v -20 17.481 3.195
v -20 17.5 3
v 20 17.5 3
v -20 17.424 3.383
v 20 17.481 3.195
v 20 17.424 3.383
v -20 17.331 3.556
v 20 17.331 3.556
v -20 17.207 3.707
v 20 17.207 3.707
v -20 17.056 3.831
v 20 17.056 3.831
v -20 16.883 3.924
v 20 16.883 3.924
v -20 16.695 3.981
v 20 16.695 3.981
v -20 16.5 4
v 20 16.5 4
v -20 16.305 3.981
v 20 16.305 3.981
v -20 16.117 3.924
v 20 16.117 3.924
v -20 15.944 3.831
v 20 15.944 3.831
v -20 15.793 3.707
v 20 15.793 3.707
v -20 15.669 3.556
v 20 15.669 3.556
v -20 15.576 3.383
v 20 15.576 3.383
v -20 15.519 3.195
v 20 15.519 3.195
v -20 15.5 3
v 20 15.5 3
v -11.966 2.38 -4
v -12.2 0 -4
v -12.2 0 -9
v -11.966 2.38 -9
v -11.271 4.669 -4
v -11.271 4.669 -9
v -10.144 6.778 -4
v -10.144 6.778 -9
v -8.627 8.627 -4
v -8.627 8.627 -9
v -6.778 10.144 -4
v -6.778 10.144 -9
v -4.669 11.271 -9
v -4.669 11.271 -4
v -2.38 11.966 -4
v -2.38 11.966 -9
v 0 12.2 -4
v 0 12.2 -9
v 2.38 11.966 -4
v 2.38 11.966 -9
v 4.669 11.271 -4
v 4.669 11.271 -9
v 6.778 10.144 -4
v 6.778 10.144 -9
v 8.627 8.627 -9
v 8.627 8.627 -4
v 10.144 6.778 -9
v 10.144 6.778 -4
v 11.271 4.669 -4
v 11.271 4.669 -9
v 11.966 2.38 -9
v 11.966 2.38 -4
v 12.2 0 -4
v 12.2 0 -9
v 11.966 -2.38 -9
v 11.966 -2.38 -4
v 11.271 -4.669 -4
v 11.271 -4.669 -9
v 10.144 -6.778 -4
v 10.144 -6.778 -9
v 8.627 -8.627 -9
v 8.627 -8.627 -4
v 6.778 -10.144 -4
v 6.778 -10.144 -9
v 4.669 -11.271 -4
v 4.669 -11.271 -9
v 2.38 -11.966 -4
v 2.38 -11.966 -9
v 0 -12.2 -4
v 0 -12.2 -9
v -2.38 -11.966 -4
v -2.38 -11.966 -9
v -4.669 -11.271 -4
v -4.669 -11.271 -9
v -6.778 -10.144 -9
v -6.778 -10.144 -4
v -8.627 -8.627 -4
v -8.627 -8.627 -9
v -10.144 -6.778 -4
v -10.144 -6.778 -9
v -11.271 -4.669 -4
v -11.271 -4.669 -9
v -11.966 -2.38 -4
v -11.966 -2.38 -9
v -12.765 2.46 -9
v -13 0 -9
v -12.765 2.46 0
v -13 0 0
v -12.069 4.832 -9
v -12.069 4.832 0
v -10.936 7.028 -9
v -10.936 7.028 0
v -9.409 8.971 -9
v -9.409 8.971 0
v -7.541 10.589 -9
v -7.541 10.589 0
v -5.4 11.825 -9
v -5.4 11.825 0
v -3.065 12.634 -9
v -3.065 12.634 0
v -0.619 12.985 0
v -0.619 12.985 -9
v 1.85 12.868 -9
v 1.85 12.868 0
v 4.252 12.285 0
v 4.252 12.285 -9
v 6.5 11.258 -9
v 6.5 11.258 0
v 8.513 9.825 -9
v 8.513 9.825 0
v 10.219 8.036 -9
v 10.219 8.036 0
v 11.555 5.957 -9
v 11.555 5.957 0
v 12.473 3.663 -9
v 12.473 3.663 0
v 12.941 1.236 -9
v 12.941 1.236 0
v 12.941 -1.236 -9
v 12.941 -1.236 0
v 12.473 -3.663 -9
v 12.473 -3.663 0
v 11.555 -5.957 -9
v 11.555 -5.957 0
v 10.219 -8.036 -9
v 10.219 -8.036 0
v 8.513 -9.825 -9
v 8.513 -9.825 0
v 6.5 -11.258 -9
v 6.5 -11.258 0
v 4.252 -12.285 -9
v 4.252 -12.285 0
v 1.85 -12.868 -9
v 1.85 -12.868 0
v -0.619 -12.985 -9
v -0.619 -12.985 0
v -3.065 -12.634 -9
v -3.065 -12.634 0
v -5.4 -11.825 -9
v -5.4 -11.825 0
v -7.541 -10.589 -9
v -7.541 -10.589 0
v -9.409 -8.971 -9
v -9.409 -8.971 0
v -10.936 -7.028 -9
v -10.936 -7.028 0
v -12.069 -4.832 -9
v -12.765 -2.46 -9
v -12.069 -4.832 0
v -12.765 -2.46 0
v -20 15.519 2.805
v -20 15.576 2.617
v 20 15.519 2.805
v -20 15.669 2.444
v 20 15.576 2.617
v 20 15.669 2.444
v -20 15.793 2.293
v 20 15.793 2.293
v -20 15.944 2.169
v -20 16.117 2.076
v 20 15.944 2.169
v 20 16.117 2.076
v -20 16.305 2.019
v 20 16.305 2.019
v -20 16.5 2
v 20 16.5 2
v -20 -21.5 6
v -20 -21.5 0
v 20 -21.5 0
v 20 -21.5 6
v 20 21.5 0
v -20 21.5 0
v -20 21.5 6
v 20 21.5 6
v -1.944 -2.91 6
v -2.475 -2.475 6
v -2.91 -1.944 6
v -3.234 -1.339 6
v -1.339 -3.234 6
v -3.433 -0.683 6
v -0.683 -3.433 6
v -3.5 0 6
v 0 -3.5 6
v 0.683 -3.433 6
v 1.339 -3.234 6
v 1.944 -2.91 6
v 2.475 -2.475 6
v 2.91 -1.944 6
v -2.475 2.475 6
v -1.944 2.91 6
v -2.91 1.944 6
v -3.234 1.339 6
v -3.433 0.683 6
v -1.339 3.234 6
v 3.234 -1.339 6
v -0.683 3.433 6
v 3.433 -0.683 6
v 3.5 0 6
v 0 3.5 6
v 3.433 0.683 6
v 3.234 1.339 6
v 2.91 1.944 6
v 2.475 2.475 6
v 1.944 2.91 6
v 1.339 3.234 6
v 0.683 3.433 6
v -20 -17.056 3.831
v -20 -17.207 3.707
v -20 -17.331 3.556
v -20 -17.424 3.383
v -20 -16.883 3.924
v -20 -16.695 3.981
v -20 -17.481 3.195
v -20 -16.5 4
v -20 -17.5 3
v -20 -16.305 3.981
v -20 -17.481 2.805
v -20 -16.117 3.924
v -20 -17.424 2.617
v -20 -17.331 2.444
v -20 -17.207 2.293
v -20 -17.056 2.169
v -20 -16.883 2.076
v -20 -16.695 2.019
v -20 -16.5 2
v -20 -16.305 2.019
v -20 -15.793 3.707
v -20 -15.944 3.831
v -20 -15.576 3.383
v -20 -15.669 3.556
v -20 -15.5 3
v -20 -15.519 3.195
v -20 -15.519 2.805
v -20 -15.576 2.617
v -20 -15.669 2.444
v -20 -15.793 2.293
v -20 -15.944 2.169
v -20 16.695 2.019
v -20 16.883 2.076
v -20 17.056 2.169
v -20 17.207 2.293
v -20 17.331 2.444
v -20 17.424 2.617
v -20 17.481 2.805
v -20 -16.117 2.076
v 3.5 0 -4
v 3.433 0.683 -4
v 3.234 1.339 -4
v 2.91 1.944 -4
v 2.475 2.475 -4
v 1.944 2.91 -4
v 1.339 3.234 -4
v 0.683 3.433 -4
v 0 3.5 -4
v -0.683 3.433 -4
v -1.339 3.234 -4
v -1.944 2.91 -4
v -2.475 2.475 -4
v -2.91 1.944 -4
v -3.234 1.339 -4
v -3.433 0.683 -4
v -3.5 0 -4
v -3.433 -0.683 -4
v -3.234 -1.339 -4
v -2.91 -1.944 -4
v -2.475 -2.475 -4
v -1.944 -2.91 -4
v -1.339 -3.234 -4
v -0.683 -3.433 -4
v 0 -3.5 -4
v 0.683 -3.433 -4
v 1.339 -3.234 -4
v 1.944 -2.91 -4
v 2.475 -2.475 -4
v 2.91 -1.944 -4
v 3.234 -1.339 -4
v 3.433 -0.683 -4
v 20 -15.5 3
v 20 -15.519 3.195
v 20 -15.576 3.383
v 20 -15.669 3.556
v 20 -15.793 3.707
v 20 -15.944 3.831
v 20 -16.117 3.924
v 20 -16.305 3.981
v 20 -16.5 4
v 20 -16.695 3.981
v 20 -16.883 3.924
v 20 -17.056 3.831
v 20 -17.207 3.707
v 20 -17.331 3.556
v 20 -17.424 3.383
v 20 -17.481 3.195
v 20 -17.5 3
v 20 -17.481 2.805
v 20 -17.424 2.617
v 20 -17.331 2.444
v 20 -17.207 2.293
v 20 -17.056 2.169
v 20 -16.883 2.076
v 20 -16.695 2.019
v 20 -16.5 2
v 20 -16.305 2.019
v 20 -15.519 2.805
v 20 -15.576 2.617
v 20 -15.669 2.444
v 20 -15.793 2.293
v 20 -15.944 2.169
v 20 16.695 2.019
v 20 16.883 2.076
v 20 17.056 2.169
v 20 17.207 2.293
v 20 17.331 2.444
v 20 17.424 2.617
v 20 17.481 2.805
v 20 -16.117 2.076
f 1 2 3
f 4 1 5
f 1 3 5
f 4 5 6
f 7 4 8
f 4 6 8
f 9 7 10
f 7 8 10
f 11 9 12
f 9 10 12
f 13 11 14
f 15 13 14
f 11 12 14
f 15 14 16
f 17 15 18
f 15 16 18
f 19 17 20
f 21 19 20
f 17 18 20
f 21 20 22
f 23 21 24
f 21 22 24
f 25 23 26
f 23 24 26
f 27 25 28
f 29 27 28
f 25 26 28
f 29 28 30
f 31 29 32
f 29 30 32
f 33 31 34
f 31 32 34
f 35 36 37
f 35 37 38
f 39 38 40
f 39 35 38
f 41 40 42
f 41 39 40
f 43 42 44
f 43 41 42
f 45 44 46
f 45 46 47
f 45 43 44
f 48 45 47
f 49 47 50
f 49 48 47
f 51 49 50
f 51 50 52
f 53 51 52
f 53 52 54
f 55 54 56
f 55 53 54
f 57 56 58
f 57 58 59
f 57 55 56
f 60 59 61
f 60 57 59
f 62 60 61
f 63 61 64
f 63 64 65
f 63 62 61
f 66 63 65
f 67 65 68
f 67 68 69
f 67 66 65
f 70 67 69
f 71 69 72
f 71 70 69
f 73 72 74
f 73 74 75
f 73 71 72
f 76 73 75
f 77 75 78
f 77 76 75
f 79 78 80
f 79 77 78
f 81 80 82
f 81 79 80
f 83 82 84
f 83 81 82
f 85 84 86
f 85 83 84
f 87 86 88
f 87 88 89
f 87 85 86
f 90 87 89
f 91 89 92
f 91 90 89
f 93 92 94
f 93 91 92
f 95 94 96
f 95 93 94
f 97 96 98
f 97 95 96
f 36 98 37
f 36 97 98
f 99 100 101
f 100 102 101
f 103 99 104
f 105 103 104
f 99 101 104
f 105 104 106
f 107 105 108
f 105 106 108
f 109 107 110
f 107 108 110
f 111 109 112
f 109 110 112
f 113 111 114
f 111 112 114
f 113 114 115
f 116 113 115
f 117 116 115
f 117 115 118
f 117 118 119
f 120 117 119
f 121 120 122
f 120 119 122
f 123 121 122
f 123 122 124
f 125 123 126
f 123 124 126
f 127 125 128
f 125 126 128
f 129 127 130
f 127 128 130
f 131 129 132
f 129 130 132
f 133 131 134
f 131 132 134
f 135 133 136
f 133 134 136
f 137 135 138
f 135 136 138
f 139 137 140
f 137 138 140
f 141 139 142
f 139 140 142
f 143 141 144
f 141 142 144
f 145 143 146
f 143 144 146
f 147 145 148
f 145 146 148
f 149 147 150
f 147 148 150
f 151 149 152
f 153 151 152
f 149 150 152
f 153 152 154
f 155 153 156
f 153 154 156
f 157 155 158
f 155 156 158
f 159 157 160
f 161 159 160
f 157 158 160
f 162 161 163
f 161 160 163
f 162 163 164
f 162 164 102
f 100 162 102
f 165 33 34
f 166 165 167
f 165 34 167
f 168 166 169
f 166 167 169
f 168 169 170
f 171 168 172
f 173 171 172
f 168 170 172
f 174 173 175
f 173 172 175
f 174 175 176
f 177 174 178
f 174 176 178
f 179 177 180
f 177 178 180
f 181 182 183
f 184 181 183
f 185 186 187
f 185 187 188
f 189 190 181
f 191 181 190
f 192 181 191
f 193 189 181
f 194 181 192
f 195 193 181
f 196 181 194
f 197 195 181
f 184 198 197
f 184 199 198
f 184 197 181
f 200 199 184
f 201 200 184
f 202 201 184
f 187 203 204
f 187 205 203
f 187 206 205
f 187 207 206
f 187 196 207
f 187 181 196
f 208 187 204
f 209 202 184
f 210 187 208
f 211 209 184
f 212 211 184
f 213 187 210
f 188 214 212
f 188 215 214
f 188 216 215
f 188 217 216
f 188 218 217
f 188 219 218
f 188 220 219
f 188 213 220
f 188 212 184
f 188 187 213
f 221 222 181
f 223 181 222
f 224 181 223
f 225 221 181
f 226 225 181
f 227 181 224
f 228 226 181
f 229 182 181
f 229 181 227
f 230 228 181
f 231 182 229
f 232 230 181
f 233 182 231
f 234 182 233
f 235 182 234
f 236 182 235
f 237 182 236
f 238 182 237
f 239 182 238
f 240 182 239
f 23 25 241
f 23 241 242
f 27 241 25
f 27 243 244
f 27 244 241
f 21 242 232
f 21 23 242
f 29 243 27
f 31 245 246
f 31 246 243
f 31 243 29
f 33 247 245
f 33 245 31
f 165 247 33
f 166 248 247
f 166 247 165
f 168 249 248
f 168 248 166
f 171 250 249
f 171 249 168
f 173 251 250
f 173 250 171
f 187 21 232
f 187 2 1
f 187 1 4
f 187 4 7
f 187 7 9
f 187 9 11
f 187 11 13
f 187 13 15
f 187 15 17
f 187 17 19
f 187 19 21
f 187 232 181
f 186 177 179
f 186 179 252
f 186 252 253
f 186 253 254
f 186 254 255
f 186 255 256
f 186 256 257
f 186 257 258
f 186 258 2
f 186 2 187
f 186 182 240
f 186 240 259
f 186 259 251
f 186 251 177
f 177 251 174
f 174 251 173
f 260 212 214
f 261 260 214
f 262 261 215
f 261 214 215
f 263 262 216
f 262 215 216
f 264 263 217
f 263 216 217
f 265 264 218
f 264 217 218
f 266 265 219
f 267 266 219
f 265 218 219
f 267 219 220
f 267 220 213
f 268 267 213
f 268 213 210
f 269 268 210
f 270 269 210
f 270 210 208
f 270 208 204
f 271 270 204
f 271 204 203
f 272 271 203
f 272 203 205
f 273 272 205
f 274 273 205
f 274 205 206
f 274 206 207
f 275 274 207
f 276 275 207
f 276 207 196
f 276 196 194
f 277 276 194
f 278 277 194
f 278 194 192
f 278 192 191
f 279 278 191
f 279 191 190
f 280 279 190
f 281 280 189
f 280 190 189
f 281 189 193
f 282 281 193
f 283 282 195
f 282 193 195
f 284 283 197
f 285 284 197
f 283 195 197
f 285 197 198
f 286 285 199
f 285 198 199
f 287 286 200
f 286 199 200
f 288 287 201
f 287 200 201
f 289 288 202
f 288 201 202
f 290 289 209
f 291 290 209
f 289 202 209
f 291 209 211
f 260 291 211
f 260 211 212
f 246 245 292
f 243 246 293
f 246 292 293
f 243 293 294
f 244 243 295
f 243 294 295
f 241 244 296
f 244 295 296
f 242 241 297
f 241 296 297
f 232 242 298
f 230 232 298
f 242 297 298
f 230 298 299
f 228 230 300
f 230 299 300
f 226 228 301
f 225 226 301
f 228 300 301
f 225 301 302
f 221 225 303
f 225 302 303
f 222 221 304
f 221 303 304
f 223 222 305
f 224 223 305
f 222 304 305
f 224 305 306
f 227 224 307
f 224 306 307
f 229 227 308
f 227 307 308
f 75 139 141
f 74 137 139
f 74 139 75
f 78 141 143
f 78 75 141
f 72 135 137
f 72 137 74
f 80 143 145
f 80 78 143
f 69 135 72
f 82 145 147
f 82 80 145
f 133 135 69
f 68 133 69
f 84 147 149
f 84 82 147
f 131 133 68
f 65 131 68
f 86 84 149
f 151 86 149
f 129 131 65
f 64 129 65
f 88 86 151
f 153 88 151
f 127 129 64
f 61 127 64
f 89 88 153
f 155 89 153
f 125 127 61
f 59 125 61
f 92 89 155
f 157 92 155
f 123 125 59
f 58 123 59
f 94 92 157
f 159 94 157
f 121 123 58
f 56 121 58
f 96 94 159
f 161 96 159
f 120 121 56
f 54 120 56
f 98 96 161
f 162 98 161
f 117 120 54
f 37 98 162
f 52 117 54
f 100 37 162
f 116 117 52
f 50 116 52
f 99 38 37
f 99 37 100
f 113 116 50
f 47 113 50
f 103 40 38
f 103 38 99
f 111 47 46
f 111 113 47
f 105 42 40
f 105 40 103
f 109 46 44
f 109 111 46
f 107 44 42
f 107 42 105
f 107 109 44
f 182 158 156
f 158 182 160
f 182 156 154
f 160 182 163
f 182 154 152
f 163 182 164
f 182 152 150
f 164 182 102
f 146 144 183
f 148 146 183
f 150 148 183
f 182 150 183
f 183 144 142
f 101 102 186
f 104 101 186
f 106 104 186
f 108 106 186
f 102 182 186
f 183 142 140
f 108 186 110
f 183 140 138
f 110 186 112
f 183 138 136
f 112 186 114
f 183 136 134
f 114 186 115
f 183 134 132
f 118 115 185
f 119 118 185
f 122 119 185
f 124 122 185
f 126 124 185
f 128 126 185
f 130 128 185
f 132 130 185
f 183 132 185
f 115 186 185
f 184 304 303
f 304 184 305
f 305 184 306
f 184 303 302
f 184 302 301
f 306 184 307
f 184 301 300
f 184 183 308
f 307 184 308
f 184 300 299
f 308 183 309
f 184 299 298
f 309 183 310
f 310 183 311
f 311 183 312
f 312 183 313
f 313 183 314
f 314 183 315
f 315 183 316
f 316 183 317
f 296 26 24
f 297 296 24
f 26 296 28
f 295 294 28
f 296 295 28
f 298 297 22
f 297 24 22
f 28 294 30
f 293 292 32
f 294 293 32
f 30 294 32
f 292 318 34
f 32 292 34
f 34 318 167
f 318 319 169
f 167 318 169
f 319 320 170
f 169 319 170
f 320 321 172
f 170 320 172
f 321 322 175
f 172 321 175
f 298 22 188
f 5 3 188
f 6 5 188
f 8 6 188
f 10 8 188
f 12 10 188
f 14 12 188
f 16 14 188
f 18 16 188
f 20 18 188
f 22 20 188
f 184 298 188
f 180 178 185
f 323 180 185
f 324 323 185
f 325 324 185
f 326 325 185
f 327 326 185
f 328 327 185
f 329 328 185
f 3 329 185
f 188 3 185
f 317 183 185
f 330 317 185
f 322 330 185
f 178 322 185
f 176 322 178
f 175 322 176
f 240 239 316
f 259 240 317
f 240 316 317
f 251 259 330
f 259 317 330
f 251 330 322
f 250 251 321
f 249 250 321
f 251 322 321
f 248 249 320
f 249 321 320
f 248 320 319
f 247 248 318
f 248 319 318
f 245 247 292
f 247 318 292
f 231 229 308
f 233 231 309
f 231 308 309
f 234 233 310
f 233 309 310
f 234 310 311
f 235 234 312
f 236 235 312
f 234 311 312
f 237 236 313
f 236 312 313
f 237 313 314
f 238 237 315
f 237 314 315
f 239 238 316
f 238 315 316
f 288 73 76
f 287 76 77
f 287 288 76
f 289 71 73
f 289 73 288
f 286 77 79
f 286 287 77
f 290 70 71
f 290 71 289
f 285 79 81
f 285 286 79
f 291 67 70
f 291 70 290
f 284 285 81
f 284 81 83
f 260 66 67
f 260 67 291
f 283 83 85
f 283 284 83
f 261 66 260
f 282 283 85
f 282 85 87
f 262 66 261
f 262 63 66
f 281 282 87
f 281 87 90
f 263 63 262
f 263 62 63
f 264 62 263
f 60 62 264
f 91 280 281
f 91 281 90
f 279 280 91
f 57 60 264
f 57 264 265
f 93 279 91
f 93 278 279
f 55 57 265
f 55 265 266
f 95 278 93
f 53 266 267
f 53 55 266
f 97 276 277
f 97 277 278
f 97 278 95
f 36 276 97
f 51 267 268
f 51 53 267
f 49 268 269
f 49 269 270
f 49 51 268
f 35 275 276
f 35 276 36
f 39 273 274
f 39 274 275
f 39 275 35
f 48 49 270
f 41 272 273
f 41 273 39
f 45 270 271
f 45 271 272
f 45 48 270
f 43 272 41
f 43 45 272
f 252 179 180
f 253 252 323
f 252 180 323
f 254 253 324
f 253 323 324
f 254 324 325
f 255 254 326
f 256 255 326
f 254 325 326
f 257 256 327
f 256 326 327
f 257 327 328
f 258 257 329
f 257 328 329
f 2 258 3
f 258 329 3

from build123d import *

# Parameters (mm, degrees)
SKETCH_1_W          = 40
SKETCH_1_H          = 43
SKETCH_1_R          = 1.5
EXTRUDE_1_DEPTH     = 6
CUT_EXTRUDE_1_DEPTH = 46.806658905
SKETCH_3_R          = 13
EXTRUDE_2_DEPTH     = 4
SKETCH_4_R          = 13
SKETCH_4_R_2        = 12.2
EXTRUDE_3_DEPTH     = 5
SKETCH_5_R          = 3.5
CUT_EXTRUDE_2_DEPTH = 33.973474188


with BuildPart() as part:
    # 草图1 → 凸台-拉伸1 (new body)
    with BuildSketch(Plane.XY):
        Rectangle(SKETCH_1_W, SKETCH_1_H)
        Circle(SKETCH_1_R, mode=Mode.SUBTRACT)
    extrude(amount=EXTRUDE_1_DEPTH)

    # 草图2 → 切除-拉伸1 (cut, through all)
    with BuildSketch(Plane(origin=(20, 0, 0), x_dir=(0, 0, -1), z_dir=(1, 0, 0))):
        with BuildLine():
            ThreePointArc((-2, 16.5), (-2.292893219, 17.207106781), (-3, 17.5))
            Line((-3, 17.5), (-3, 15.5))
            ThreePointArc((-3, 15.5), (-2.292893219, 15.792893219), (-2, 16.5))
        make_face()
        with BuildLine():
            Line((-3, 15.5), (-3, 17.5))
            ThreePointArc((-3, 17.5), (-4, 16.5), (-3, 15.5))
        make_face()
        with BuildLine():
            ThreePointArc((-2, -16.5), (-2.292893219, -15.792893219), (-3, -15.5))
            Line((-3, -15.5), (-3, -17.5))
            ThreePointArc((-3, -17.5), (-2.292893219, -17.207106781), (-2, -16.5))
        make_face()
        with BuildLine():
            Line((-3, -17.5), (-3, -15.5))
            ThreePointArc((-3, -15.5), (-4, -16.5), (-3, -17.5))
        make_face()
    extrude(amount=-CUT_EXTRUDE_1_DEPTH, mode=Mode.SUBTRACT)

    # 草图3 → 凸台-拉伸2 (add)
    with BuildSketch(Plane(origin=(0, 0, 0), x_dir=(-1, 0, 0), z_dir=(0, 0, -1))):
        Circle(SKETCH_3_R)
    extrude(amount=EXTRUDE_2_DEPTH)

    # 草图4 → 凸台-拉伸3 (add)
    with BuildSketch(Plane(origin=(0, 0, -4), x_dir=(-1, 0, 0), z_dir=(0, 0, -1))):
        Circle(SKETCH_4_R)
        Circle(SKETCH_4_R_2, mode=Mode.SUBTRACT)
    extrude(amount=EXTRUDE_3_DEPTH)

    # 草图5 → 切除-拉伸2 (cut, through all)
    with BuildSketch(Plane.XY.offset(6)):
        Circle(SKETCH_5_R)
    extrude(amount=-CUT_EXTRUDE_2_DEPTH, mode=Mode.SUBTRACT)


solid = part.part
